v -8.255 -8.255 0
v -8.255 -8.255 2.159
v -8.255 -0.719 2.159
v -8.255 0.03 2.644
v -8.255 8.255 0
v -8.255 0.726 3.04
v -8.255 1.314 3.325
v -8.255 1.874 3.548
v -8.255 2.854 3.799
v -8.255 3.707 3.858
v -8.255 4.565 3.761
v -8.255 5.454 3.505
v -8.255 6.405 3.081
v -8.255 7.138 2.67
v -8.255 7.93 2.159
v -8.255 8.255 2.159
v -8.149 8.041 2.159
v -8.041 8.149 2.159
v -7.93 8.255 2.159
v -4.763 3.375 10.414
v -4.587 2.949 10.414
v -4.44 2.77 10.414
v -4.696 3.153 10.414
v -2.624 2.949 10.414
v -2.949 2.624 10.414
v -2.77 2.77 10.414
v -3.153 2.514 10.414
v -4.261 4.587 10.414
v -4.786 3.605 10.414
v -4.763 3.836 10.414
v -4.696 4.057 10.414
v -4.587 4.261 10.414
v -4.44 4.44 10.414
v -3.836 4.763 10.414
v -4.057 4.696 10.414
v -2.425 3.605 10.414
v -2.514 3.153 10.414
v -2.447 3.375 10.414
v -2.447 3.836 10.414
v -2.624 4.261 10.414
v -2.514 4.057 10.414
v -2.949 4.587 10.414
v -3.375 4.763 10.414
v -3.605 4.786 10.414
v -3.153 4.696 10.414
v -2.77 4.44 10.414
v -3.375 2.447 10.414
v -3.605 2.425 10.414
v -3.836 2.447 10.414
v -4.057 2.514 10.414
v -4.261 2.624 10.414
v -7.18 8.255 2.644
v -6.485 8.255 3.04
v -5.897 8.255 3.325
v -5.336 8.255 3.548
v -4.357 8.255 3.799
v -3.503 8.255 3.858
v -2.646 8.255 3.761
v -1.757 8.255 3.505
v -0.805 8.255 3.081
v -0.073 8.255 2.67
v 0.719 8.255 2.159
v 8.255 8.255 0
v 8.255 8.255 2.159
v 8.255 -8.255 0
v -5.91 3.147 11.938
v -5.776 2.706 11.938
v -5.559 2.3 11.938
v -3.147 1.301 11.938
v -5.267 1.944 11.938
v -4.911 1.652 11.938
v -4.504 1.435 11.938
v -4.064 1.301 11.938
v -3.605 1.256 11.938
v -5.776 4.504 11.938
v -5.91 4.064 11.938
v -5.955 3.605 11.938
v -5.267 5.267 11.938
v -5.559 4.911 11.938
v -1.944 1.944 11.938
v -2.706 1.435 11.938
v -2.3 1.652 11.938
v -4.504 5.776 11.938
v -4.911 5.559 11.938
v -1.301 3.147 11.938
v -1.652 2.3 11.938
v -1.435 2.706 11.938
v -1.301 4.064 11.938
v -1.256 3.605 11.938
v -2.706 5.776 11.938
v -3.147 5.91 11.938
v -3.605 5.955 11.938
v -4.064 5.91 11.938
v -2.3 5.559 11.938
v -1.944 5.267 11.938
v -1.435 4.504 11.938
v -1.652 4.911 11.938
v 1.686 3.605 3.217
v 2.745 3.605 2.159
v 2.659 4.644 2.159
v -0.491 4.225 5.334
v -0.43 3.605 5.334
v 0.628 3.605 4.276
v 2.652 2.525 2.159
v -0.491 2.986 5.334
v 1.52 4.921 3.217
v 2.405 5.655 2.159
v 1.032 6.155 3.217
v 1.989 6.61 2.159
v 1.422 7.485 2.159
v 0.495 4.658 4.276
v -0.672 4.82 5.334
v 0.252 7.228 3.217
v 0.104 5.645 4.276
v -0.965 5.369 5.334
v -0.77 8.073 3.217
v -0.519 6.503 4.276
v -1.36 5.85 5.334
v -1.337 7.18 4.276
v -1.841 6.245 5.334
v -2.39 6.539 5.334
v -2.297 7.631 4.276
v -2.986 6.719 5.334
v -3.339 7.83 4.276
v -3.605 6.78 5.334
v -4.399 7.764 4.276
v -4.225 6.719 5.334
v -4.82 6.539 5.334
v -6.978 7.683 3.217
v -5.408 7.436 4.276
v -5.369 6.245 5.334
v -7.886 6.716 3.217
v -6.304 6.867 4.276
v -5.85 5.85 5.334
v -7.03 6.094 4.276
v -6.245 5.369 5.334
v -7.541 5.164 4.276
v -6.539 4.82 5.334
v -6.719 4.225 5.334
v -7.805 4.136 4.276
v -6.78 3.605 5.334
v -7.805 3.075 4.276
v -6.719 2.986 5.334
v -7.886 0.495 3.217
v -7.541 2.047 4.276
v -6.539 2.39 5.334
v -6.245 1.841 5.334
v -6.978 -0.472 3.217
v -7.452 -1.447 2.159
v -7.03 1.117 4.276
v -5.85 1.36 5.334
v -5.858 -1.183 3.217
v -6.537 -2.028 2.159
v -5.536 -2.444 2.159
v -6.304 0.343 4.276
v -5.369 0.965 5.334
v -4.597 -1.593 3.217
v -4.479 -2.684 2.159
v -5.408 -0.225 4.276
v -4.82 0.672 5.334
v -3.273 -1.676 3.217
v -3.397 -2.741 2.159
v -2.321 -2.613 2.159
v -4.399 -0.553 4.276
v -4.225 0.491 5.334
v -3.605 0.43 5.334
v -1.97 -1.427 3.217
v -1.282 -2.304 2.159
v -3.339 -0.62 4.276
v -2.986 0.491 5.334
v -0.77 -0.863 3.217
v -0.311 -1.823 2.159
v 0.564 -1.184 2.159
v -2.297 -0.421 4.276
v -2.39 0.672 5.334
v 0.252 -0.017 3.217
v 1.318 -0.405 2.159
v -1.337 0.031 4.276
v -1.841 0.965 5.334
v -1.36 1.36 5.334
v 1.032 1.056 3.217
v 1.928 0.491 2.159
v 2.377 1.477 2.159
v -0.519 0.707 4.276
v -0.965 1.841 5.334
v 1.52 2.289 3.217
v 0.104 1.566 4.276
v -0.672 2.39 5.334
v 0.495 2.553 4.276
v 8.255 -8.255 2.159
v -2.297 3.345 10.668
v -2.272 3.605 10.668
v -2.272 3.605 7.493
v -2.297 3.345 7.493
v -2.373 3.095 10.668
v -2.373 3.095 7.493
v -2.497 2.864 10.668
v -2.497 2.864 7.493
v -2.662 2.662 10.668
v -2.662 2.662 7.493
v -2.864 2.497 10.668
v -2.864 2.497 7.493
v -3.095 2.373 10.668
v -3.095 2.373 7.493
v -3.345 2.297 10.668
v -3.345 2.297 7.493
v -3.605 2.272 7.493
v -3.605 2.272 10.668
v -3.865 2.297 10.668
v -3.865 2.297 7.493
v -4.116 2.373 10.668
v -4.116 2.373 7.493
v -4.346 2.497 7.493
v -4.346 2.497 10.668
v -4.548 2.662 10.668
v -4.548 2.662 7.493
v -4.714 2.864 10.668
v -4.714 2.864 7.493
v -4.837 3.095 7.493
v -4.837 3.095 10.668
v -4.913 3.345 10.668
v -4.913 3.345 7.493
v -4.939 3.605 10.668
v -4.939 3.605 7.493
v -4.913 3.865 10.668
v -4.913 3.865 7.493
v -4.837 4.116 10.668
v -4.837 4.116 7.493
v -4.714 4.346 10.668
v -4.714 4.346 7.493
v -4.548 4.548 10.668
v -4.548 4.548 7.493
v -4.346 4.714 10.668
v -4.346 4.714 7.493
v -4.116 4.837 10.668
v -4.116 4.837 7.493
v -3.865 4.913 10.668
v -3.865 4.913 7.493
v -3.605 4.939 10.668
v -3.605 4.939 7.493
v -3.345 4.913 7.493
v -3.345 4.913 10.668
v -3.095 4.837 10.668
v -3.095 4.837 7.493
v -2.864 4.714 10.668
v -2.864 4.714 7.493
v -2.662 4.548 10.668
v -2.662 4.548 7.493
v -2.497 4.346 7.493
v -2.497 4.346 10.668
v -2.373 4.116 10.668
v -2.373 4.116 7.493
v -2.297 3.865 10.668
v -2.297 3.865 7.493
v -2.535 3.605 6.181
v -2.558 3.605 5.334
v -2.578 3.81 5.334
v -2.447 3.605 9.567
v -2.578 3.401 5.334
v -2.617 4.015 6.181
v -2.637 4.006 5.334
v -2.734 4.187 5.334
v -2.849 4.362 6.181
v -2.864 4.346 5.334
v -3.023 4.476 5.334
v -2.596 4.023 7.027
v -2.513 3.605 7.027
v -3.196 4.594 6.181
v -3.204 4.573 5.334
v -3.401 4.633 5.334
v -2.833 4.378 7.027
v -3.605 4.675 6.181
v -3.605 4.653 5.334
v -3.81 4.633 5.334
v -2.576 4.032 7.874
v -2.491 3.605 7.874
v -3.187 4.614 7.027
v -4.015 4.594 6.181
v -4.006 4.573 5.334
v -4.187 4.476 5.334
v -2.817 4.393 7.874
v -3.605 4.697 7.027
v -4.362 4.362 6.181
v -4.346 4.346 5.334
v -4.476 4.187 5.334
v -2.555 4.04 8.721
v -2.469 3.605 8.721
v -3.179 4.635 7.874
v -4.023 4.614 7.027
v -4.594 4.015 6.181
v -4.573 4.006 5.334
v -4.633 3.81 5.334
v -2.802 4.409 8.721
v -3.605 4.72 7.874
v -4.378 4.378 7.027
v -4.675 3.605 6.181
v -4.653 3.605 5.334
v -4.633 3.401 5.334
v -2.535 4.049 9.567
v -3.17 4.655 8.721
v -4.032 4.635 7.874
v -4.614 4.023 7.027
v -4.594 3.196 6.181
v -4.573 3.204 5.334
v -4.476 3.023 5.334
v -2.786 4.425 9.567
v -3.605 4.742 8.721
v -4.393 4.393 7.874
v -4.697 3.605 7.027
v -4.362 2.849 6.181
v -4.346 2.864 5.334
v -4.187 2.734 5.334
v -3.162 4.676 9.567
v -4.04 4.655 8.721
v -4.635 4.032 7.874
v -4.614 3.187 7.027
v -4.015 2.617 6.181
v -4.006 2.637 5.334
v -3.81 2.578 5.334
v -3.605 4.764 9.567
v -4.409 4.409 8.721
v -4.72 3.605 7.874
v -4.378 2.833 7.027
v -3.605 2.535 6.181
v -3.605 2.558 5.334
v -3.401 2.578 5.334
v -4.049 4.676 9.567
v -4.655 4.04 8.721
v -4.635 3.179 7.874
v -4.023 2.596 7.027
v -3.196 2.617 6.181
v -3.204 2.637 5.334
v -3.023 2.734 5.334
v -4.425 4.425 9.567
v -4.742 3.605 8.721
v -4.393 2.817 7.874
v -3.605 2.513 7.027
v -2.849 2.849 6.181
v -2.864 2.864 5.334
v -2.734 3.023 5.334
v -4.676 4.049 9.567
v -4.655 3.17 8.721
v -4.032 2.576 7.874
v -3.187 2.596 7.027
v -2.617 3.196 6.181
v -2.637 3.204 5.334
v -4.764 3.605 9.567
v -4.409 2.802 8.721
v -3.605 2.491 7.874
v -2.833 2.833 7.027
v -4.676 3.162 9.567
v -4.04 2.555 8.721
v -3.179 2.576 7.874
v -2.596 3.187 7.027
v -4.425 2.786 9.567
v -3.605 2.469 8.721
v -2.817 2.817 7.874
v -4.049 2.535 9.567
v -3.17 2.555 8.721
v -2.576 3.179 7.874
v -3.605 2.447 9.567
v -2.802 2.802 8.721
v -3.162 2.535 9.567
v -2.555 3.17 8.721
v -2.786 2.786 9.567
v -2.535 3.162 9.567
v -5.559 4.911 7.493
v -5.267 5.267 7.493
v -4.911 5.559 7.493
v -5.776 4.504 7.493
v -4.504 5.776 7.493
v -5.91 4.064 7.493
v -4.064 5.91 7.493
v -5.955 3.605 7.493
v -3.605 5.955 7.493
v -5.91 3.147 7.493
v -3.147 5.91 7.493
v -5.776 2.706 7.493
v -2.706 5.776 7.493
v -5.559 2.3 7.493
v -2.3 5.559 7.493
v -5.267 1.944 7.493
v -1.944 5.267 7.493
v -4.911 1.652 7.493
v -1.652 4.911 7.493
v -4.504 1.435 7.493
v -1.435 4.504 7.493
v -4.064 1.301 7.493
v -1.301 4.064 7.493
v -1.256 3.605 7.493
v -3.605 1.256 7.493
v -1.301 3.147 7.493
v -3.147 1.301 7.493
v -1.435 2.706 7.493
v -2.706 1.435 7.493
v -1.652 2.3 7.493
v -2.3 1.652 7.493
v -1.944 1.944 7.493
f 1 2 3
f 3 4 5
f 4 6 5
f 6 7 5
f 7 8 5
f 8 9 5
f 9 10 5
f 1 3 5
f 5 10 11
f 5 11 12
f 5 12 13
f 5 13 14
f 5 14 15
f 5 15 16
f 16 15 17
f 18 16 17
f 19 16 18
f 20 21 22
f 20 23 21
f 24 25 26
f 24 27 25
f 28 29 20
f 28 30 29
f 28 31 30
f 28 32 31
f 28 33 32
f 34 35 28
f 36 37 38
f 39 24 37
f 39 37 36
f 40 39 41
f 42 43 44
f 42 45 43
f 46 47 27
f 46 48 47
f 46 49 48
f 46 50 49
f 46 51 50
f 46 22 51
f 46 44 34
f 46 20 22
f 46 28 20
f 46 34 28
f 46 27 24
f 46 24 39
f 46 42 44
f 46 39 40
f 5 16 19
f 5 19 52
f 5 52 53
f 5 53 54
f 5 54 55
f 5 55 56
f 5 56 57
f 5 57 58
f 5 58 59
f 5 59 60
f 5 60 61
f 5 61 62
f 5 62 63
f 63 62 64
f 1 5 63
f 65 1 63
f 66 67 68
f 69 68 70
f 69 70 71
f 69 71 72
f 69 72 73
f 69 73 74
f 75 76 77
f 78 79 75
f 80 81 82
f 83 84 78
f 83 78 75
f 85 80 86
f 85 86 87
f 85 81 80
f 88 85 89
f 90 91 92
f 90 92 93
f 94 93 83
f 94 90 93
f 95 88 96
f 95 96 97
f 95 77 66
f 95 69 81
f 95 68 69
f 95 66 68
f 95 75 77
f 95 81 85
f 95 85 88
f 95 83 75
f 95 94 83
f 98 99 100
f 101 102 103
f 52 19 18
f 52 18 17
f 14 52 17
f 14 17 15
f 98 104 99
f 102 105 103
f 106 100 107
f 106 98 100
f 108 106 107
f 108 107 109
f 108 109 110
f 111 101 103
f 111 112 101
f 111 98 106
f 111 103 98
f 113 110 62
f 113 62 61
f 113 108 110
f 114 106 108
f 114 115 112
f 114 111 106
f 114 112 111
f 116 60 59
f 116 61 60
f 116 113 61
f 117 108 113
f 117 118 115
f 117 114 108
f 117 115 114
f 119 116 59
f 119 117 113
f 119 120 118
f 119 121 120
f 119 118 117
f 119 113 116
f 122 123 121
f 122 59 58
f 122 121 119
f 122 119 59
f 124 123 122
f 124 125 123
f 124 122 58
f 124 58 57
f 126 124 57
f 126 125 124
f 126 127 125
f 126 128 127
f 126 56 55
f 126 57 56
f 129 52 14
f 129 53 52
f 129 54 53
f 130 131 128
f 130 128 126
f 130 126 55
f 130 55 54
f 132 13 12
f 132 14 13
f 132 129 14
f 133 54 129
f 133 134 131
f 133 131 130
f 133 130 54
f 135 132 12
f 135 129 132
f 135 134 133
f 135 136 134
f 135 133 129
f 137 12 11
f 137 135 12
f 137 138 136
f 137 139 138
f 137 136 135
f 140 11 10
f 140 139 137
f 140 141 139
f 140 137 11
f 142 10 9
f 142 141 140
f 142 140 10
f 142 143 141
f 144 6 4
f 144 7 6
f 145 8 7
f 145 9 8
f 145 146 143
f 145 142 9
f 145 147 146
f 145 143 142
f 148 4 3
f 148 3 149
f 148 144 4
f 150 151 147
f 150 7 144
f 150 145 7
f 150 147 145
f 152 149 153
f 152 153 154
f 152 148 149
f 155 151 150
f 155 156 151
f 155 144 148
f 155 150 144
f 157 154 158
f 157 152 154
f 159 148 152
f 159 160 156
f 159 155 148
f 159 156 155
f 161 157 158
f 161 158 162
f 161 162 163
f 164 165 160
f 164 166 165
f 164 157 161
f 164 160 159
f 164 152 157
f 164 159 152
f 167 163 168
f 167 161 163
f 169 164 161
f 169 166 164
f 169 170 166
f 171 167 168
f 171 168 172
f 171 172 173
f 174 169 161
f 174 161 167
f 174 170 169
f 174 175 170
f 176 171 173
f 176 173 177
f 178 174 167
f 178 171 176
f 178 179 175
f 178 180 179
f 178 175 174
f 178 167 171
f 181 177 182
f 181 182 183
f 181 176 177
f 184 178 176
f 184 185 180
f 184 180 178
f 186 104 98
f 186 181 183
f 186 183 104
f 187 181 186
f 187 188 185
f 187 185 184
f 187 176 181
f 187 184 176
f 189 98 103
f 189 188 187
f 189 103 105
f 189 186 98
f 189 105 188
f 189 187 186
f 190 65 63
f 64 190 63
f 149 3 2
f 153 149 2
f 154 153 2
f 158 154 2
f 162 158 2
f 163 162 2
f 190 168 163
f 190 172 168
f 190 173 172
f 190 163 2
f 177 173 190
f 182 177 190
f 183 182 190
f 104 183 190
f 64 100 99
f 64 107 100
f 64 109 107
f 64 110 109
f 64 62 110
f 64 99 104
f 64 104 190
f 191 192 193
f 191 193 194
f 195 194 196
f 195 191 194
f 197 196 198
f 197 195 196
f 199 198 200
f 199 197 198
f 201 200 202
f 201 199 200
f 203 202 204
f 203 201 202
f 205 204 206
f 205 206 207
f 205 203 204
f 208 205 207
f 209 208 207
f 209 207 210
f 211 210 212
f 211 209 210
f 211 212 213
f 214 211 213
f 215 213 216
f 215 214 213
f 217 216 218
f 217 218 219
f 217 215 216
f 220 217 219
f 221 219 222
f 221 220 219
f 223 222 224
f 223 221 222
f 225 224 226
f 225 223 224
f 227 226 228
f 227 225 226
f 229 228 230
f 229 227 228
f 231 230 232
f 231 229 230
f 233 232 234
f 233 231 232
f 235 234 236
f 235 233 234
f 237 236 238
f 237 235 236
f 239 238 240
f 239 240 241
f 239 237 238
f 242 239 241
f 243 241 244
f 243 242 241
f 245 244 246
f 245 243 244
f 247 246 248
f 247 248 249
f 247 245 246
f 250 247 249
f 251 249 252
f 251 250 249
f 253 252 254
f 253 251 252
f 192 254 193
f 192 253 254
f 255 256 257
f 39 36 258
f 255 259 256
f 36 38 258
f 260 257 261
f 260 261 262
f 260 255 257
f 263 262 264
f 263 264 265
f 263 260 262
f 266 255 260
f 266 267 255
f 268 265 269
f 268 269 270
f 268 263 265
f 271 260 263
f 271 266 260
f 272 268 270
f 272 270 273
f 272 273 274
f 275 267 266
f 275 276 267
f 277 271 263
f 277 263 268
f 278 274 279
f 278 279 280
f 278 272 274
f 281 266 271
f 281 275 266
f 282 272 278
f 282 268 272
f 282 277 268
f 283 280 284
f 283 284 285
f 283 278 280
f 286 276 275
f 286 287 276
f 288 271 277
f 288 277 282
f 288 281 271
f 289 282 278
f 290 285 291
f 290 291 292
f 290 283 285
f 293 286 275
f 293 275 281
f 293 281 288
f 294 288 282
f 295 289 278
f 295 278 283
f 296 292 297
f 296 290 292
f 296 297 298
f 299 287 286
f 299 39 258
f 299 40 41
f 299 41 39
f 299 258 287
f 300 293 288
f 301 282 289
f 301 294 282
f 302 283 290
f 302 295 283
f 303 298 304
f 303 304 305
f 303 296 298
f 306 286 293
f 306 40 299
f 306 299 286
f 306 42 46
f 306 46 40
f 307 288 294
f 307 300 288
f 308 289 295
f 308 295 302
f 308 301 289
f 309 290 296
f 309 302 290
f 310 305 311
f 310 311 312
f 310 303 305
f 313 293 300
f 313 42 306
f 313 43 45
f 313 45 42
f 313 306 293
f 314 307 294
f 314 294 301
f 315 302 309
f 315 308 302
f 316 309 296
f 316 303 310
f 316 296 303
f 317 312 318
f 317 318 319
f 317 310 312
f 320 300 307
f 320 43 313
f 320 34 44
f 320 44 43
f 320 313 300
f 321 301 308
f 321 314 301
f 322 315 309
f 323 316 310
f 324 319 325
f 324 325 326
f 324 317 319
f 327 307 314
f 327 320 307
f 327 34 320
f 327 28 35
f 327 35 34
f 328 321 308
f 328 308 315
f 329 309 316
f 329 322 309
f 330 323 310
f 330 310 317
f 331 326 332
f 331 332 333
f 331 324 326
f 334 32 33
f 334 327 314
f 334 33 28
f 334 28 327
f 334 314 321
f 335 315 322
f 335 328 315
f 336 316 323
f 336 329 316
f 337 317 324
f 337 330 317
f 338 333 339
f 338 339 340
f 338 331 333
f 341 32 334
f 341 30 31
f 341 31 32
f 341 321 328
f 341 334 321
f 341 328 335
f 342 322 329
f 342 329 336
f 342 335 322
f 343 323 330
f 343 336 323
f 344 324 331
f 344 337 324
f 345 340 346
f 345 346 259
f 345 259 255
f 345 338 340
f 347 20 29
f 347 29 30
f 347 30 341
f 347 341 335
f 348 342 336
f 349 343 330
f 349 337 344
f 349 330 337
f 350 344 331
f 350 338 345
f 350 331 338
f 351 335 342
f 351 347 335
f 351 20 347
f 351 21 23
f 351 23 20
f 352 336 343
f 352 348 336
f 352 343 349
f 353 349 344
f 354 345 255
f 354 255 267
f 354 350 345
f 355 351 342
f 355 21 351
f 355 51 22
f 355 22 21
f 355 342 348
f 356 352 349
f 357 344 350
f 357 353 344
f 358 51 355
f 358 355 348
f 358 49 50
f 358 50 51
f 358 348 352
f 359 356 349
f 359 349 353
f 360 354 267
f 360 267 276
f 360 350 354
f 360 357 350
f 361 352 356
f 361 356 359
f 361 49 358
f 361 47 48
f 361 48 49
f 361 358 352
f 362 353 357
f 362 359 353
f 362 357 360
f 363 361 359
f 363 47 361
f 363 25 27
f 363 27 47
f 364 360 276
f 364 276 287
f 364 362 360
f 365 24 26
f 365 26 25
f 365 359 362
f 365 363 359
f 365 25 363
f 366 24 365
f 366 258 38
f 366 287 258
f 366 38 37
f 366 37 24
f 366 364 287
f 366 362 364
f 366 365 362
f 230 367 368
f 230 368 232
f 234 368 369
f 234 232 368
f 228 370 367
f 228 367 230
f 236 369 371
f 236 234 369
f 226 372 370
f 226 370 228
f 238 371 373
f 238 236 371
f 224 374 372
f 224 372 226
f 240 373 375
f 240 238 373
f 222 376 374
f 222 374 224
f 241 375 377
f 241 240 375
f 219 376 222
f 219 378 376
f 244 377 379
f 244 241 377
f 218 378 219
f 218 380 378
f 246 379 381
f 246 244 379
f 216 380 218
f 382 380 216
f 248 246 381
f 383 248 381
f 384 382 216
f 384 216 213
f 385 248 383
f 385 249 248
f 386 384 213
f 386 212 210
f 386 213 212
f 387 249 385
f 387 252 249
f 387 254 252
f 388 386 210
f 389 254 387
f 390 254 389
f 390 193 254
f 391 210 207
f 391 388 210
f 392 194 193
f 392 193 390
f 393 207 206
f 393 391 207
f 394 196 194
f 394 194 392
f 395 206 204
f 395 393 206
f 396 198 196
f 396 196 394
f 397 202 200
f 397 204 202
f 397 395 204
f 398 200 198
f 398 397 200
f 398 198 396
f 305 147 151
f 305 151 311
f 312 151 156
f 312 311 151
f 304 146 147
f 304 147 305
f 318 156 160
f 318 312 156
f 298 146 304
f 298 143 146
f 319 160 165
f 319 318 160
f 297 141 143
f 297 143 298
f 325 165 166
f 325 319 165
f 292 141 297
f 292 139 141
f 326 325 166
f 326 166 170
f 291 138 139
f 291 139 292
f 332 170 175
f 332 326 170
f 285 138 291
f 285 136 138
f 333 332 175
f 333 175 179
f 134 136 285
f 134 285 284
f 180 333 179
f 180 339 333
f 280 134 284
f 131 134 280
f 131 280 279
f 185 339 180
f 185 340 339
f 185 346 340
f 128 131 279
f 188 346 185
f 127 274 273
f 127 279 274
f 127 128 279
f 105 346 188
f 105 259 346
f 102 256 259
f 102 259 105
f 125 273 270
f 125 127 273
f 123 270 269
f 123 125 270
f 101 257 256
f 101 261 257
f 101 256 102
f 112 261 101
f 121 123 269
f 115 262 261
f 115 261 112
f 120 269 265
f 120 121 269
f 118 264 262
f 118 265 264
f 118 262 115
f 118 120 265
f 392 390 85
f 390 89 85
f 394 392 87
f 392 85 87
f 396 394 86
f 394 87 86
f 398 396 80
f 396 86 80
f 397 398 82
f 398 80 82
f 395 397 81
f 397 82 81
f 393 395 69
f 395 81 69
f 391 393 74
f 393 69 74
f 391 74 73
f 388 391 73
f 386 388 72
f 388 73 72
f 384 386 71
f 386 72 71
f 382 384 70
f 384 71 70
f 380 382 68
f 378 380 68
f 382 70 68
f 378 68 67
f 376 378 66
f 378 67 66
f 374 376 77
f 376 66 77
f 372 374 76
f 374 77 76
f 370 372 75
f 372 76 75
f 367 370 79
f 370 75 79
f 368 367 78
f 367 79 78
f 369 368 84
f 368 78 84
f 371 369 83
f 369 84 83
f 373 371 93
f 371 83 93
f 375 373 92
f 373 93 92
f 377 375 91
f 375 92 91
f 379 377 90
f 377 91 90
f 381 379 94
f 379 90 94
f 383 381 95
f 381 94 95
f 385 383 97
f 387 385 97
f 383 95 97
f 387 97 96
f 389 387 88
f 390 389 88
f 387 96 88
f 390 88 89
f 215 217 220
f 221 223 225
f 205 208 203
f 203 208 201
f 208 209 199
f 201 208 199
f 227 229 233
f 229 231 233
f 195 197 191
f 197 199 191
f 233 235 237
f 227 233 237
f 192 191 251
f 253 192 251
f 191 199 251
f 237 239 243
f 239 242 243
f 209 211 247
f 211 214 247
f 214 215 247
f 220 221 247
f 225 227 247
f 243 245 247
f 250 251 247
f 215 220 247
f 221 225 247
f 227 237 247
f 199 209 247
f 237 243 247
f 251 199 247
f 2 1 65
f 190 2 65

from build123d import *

# Parameters (mm, degrees)
F0_W          = 16.51
F0_H          = 16.51
F1_DEPTH      = 2.159
F2_R          = 3.175
F3_DEPTH      = 3.175
F3_DEPTH_BACK = 1.27
F4_R          = 1.04775
F5_DEPTH      = 5.08
F5_TAPER      = -1.5
F8_R          = 2.3495
F9_DEPTH      = 1.27
F10_R         = 2.3495
F10_R_2       = 1.3335
F11_DEPTH     = 3.175


# Not quite as in the source:
# - a fillet or chamfer that OpenCascade refuses, or shapes differently, is made with other operations: its cross-section is extruded or revolved along the edge and cut away or added


with BuildPart() as f1:
    # F0 (on Top) → F1 (new body)
    with BuildSketch(Plane.XY):
        Rectangle(F0_W, F0_H)
    extrude(amount=F1_DEPTH)

    # F2 (on face) → F3 (join, two sides)
    with BuildSketch(Plane.XY.offset(2.159)) as f3_sk:
        with Locations((-3.605306847, 3.605306847)):
            Circle(F2_R)
    extrude(amount=F3_DEPTH)
    extrude(f3_sk.sketch, amount=-F3_DEPTH_BACK)

    # F4 (on face) → F5 (join)
    with BuildSketch(Plane.XY.offset(5.334)):
        with Locations((-3.605306847, 3.605306847)):
            Circle(F4_R)
    extrude(amount=F5_DEPTH, taper=F5_TAPER)

    # F12: chamfer of 3.175 on 1 edges, made by hand


with BuildPart() as f9:
    # F8 (on offset) → F9 (new body)
    with BuildSketch(Plane.XY.offset(10.668)):
        with Locations((-3.605306847, 3.605306847)):
            Circle(F8_R)
    extrude(amount=F9_DEPTH)

    # F10 (on face) → F11 (join)
    with BuildSketch(Plane(origin=(0, 0, 10.668), x_dir=(1, 0, 0), z_dir=(0, 0, -1))):
        with Locations((-3.605306847, -3.605306847)):
            Circle(F10_R)
        with Locations((-3.605306847, -3.605306847)):
            Circle(F10_R_2, mode=Mode.SUBTRACT)
    extrude(amount=F11_DEPTH)


with BuildPart() as f12_tool2:
    # F12_s3 → F12_t4 (revolve)
    with BuildSketch(Plane.XZ.offset(-3.605306847)):
        Polygon((2.744693153, 2.159), (-0.430306847, 5.334), (-0.430306847, 2.159), align=None)
    revolve(axis=Axis((-3.605306847, 3.605306847, 2.159), (0, 0, 1)))

    split(bisect_by=Plane.XZ.offset(-8.255), keep=Keep.TOP)

    split(bisect_by=Plane.YZ.offset(-8.255), keep=Keep.TOP)

    split(bisect_by=Plane.XY.offset(5.334), keep=Keep.BOTTOM)


with BuildPart() as f1_1:
    add(f1.part)

    # F12_t1: union F12_tool2
    add(f12_tool2.part)


solid = Compound([f9.part, f1_1.part])
